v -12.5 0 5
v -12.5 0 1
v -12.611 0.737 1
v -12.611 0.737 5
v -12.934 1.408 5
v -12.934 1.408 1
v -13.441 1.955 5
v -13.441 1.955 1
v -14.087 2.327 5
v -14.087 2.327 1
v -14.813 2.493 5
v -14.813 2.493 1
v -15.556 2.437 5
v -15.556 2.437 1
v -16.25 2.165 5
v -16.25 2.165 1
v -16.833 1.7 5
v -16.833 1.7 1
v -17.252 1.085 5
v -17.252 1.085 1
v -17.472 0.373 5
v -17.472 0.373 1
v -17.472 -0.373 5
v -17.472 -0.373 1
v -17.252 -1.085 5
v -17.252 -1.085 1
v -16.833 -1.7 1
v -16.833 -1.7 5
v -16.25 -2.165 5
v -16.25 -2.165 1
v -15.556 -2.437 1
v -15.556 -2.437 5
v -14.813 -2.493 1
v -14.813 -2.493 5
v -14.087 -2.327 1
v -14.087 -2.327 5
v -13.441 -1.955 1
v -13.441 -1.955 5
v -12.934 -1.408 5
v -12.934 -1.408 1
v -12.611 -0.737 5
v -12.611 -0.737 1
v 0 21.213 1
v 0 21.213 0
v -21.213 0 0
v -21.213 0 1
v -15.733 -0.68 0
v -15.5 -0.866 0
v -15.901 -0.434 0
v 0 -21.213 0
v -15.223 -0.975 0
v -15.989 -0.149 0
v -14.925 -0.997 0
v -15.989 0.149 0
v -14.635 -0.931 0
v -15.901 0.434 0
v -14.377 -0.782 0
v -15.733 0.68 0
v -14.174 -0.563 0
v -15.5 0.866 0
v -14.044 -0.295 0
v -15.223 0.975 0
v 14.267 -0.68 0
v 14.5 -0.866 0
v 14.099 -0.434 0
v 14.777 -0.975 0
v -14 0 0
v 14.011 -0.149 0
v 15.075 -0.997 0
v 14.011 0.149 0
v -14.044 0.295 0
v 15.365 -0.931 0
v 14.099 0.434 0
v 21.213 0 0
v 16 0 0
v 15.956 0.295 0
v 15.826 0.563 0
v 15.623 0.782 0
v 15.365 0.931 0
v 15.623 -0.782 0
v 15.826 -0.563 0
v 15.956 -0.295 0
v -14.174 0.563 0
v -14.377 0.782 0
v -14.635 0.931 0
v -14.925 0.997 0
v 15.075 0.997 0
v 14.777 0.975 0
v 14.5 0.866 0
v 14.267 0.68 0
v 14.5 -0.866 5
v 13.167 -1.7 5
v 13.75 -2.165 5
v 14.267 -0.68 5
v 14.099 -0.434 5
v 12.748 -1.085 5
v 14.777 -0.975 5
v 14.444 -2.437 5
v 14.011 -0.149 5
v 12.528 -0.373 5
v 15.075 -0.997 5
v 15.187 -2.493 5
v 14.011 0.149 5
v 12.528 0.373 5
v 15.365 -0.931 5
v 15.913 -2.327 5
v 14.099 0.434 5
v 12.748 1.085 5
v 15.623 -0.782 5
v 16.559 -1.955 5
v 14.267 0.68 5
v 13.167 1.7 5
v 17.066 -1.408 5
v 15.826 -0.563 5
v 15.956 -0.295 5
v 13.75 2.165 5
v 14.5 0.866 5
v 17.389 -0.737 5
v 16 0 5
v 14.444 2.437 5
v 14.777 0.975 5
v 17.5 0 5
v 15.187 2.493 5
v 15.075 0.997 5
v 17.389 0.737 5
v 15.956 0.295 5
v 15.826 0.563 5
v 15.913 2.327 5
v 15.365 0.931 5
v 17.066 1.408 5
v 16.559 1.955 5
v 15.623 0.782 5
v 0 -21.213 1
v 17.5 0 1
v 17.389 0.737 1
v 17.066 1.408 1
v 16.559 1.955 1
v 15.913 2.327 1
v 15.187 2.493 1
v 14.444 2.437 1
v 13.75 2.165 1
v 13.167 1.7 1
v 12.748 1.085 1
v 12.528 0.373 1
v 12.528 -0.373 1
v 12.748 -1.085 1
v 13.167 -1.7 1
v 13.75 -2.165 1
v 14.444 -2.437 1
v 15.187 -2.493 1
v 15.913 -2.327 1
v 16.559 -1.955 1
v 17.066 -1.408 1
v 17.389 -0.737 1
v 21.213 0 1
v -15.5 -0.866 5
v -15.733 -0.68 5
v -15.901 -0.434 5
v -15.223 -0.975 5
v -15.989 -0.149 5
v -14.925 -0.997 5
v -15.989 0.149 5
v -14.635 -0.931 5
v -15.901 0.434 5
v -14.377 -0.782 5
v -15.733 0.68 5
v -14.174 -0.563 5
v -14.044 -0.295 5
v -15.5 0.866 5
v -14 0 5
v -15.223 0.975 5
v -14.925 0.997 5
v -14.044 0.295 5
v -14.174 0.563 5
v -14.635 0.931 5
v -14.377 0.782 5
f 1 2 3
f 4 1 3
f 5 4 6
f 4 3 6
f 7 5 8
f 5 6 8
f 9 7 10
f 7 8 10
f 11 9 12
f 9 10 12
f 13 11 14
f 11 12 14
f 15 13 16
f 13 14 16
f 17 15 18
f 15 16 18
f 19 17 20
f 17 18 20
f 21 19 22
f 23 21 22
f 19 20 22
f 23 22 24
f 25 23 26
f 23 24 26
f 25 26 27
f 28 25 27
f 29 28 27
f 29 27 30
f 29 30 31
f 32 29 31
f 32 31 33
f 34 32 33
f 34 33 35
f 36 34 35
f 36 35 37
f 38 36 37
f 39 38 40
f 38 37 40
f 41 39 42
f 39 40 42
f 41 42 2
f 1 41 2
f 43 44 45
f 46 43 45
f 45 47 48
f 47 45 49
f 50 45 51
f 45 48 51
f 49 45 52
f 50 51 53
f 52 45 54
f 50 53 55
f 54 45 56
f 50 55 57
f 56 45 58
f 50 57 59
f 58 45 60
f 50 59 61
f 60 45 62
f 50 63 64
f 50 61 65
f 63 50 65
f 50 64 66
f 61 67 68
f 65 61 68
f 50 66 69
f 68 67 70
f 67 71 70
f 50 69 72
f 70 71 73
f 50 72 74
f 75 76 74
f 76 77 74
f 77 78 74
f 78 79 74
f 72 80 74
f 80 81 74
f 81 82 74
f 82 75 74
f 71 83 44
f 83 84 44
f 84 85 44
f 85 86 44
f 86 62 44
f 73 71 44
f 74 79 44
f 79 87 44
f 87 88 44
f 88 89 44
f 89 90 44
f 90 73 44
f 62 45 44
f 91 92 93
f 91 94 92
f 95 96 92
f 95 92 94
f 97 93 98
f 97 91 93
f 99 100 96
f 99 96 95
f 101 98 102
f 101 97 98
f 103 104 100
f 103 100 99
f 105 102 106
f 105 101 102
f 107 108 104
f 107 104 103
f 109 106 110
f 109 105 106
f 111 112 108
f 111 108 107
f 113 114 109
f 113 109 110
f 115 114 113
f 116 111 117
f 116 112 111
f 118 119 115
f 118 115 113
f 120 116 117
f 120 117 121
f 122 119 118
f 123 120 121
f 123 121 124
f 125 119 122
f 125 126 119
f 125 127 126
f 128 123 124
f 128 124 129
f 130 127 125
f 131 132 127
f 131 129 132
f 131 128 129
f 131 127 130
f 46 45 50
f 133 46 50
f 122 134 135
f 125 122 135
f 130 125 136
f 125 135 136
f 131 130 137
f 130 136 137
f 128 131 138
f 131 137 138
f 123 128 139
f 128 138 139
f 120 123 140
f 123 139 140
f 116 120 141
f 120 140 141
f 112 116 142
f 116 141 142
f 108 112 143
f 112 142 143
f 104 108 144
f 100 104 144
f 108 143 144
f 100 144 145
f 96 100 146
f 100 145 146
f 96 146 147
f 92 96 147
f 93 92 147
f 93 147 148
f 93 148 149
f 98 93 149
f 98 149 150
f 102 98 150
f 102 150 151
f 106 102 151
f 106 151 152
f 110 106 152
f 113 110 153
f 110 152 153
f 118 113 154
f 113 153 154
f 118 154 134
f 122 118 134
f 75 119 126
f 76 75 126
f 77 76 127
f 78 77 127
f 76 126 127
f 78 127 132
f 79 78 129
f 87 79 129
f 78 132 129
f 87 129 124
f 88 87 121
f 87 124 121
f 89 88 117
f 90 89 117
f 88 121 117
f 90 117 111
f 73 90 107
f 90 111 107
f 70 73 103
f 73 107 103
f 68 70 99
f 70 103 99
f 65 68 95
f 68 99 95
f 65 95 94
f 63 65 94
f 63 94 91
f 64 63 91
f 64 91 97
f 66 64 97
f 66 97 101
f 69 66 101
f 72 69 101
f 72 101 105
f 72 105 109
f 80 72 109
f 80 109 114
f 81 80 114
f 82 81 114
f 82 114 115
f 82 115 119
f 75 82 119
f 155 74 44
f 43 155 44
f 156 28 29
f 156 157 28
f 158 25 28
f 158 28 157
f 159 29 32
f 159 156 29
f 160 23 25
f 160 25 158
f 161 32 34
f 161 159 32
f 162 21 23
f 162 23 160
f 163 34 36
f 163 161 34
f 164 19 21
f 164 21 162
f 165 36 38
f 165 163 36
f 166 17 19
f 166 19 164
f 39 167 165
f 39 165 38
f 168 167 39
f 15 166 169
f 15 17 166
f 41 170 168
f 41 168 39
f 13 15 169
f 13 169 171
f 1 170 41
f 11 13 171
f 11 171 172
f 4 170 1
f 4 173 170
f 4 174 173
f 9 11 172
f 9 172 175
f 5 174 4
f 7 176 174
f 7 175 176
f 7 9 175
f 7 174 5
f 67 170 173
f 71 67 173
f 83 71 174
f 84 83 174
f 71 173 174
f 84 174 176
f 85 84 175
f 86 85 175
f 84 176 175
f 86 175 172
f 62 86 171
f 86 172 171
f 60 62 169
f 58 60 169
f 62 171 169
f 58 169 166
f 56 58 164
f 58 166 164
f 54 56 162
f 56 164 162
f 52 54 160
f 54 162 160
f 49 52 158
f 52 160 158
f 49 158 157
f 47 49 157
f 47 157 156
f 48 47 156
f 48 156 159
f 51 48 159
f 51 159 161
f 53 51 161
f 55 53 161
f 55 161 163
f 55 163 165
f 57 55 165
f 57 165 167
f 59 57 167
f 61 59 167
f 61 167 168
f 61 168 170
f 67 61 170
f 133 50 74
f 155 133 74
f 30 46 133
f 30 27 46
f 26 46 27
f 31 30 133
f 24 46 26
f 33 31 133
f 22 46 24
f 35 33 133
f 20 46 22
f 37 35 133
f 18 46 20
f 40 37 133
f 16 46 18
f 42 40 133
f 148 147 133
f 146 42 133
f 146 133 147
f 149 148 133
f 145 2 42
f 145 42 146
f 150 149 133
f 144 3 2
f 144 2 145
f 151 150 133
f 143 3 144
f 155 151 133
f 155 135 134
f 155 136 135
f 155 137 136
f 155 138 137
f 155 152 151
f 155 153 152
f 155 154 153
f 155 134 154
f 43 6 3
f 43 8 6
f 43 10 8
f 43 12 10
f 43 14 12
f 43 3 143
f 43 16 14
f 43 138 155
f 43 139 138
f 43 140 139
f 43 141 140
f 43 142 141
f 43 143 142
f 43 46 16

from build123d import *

# Parameters (mm, degrees)
F1_DEPTH = 1
F2_R     = 2.5
F3_DEPTH = 4
F4_R     = 1
F5_DEPTH = 25


with BuildPart() as f1:
    # F0 (on Top) → F1 (new body)
    with BuildSketch(Plane.XY):
        Polygon((21.213203, 0), (0, 21.213203), (-21.213203, 0), (0, -21.213203), align=None)
    extrude(amount=F1_DEPTH)

    # F2 (on face) → F3 (join)
    with BuildSketch(Plane.XY.offset(1)):
        with Locations((-15, 0)):
            Circle(F2_R)
        with Locations((15, 0)):
            Circle(F2_R)
    extrude(amount=F3_DEPTH)

    # F4 (on face) → F5 (cut)
    with BuildSketch(Plane.XY.offset(5)):
        with Locations((-15, 0)):
            Circle(F4_R)
        with Locations((15, 0)):
            Circle(F4_R)
    extrude(amount=-F5_DEPTH, mode=Mode.SUBTRACT)


solid = f1.part
